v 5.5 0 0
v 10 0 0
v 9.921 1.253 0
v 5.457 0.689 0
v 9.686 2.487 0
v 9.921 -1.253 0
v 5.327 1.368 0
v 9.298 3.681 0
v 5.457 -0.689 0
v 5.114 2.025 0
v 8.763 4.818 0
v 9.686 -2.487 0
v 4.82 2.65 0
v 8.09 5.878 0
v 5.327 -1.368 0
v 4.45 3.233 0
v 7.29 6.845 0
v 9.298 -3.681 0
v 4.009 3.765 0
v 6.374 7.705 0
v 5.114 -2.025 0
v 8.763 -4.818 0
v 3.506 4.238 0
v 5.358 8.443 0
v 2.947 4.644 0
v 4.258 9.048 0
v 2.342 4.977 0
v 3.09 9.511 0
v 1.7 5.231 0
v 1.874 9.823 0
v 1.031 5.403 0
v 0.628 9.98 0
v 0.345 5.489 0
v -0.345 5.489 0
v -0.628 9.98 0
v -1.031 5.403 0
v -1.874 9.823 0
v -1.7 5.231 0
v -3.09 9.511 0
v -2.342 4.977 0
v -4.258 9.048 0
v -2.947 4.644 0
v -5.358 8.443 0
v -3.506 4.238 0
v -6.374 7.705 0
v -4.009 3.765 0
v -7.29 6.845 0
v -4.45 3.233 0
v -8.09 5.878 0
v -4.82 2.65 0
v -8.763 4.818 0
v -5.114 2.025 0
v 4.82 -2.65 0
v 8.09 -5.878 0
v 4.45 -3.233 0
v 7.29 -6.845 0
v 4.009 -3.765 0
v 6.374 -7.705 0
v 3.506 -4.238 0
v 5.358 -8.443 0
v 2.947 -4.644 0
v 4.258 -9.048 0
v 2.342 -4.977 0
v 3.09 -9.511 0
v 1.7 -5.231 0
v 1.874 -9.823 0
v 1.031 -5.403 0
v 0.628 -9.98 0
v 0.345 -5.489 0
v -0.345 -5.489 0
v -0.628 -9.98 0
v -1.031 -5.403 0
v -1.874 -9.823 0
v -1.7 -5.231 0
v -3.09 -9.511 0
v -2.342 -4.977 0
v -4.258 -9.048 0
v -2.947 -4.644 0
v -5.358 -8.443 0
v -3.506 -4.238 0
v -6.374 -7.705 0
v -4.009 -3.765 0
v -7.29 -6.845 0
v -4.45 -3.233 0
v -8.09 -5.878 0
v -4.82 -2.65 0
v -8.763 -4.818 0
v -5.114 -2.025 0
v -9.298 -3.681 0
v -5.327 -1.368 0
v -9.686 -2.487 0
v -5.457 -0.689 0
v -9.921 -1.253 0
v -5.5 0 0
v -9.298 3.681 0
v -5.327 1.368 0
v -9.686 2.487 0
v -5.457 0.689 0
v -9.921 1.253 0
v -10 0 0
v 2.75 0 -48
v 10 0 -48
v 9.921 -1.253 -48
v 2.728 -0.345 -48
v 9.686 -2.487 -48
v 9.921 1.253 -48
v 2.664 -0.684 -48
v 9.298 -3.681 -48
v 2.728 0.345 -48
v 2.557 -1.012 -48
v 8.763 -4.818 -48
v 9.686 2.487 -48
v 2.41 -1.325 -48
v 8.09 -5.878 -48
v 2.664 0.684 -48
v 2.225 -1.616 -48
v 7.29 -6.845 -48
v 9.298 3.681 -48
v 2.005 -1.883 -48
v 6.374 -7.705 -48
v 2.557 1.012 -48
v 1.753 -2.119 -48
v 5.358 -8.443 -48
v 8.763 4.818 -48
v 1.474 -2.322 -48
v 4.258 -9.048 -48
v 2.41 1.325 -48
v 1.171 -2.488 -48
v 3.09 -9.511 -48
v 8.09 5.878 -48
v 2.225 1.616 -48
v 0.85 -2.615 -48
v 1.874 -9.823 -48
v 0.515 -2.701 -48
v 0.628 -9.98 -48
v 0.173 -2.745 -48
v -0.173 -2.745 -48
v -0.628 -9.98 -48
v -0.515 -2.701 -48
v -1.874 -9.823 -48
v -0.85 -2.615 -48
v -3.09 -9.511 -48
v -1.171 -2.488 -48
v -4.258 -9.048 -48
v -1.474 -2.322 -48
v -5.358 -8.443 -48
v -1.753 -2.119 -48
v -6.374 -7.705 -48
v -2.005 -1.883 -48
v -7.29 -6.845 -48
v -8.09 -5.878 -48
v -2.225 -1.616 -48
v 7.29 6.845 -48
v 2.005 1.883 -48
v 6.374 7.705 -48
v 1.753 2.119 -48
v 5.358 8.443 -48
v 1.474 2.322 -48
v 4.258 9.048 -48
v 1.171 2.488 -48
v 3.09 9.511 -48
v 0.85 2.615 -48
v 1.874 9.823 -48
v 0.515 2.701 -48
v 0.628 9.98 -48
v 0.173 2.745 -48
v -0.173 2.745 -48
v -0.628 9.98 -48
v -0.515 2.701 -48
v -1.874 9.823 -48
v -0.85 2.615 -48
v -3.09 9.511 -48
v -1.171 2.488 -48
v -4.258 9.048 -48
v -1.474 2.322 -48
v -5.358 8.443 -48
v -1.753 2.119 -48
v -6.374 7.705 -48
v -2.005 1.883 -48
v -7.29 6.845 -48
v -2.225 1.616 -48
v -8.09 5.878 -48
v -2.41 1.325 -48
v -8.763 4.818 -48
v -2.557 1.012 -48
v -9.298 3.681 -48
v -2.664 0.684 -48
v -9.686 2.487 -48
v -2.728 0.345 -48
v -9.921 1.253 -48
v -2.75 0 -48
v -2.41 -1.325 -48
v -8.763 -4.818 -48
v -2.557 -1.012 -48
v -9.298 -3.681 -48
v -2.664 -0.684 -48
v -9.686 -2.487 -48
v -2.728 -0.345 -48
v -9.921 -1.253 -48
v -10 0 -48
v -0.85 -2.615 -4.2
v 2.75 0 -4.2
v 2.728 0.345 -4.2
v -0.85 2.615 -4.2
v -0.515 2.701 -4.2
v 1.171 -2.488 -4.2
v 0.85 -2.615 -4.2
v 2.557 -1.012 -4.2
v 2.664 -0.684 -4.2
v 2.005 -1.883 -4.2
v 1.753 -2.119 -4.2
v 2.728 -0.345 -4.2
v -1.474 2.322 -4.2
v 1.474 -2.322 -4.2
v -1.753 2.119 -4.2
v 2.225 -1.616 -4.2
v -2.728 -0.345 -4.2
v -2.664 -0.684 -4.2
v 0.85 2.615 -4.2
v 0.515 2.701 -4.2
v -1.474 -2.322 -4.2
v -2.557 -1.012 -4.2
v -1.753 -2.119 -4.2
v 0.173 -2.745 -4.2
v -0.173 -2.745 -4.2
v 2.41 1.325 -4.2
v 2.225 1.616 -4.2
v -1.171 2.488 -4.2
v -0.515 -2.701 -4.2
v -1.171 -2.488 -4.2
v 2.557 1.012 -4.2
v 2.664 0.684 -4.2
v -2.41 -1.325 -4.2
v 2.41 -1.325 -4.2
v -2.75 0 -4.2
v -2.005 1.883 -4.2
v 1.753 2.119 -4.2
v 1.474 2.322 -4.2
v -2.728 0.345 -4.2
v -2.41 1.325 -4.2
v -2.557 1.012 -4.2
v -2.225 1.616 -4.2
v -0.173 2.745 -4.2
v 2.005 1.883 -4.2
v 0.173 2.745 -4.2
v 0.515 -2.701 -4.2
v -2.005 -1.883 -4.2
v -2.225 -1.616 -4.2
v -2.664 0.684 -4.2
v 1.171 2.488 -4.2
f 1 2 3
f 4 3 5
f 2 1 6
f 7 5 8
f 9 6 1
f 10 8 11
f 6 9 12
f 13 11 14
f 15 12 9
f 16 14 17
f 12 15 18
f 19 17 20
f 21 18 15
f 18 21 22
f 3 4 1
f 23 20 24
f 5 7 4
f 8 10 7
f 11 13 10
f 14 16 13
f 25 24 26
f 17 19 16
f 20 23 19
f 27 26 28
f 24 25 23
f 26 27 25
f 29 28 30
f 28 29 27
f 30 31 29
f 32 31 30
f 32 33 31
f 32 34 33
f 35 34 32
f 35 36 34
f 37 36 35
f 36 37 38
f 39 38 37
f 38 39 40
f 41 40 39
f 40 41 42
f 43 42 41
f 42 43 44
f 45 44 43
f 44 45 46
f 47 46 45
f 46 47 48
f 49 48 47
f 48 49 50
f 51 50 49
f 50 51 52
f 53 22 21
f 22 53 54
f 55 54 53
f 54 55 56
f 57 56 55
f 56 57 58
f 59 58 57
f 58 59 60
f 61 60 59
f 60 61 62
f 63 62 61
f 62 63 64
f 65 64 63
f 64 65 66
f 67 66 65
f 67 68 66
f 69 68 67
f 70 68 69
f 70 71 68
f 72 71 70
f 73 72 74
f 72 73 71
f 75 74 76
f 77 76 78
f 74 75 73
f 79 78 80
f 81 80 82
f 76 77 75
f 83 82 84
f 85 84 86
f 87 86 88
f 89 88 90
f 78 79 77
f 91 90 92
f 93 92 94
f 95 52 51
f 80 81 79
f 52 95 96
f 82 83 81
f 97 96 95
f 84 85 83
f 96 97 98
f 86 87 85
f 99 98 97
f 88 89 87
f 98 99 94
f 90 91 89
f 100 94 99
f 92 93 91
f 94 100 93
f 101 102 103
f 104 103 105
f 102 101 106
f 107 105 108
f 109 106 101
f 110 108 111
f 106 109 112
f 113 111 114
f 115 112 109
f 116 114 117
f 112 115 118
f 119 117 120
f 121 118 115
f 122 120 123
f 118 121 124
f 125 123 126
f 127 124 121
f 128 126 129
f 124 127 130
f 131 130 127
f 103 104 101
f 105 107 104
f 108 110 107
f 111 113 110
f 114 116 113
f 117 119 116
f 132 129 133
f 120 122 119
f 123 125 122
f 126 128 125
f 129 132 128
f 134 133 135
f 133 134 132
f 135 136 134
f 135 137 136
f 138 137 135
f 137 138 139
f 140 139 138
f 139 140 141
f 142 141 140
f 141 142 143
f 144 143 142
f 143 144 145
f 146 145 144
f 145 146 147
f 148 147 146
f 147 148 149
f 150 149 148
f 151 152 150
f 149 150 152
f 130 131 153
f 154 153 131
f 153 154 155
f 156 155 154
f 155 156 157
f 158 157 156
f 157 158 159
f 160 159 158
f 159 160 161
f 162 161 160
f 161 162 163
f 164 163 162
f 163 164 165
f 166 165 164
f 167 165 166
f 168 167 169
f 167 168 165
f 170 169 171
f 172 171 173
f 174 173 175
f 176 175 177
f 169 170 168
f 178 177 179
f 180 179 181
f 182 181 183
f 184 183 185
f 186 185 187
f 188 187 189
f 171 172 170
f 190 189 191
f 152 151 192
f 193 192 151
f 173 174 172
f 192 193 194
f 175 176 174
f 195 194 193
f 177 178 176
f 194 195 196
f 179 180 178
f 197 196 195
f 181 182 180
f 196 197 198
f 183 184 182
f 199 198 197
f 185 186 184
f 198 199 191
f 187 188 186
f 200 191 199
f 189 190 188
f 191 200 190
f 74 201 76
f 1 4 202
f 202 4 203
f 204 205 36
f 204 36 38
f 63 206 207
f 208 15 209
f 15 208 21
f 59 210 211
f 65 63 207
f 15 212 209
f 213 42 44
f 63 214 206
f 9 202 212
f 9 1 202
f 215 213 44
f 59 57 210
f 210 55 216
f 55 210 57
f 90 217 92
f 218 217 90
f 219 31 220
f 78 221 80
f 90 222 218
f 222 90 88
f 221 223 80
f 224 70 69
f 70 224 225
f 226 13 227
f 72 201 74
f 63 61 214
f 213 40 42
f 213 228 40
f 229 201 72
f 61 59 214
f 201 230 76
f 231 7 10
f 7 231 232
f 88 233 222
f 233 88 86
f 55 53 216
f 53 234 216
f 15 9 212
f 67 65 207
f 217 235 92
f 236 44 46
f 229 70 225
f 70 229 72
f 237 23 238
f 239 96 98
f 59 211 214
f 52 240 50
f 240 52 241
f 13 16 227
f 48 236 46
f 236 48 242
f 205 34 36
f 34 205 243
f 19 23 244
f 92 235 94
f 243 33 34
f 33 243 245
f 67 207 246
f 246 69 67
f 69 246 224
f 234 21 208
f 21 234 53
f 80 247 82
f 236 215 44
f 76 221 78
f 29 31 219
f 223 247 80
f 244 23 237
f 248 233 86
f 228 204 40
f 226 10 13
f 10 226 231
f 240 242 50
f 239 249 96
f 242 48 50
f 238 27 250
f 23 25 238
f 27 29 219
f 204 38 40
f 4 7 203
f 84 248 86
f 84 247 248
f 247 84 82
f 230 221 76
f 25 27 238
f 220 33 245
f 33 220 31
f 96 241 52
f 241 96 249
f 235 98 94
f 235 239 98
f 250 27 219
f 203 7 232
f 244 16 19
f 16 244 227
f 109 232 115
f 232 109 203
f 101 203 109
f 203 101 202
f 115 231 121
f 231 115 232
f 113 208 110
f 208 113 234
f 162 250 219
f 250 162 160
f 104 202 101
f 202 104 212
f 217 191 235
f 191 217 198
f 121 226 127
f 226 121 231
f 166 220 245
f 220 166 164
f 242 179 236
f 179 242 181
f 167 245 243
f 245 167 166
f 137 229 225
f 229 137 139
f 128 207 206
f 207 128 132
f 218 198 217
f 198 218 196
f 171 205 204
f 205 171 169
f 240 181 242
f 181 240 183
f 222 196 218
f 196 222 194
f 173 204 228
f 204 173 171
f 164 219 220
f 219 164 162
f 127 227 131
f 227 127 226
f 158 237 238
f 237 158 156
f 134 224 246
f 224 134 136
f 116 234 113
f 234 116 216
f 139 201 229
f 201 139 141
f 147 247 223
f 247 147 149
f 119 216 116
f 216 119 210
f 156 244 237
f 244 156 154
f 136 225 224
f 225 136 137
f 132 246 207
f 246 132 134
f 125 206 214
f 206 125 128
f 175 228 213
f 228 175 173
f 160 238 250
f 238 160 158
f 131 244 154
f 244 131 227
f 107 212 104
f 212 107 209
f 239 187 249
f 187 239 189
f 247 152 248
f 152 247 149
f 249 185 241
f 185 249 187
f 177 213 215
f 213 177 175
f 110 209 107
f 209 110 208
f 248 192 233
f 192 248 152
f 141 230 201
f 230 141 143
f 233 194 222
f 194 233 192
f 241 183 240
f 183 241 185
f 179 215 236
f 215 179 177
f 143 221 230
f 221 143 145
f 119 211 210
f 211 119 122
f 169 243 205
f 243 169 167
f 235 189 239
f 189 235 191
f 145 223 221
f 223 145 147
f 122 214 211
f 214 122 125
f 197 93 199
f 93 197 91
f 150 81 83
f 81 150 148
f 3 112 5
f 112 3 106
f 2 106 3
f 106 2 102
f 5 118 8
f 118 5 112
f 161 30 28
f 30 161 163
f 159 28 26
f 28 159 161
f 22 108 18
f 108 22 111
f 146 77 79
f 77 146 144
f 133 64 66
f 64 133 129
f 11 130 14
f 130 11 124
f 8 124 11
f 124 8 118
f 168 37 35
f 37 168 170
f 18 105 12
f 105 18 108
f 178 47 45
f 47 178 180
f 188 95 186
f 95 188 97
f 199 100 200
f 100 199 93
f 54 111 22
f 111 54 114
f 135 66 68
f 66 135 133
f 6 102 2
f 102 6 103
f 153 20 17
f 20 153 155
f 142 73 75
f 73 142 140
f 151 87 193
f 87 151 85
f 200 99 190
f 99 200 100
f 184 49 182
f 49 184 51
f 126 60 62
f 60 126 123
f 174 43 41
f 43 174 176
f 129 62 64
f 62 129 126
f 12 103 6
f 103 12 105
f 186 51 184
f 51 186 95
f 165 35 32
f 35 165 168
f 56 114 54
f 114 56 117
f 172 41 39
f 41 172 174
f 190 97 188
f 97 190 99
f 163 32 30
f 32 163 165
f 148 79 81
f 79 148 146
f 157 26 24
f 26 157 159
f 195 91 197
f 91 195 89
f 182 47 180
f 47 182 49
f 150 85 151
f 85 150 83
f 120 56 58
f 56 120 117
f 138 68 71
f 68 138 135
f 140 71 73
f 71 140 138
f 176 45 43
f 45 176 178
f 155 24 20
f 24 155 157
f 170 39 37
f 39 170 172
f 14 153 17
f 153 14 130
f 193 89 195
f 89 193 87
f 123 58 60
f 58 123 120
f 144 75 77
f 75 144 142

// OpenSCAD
$fn = 50;


difference() {
	union() {
		translate(v = [0, 0, -48.0000000000]) {
			cylinder(h = 48, r = 10.0000000000);
		}
		cylinder(h = 0, r = 19.0000000000);
	}
	union() {
		translate(v = [0, 0, 0]) {
			rotate(a = [0, 0, 0]) {
				difference() {
					union() {
						#translate(v = [0, 0, -48.0000000000]) {
							cylinder(h = 48, r = 2.2500000000);
						}
						#translate(v = [0, 0, -4.2000000000]) {
							cylinder(h = 4.2000000000, r = 10.0000000000, r1 = 2.7500000000, r2 = 5.5000000000);
						}
						#translate(v = [0, 0, -48.0000000000]) {
							cylinder(h = 48, r = 2.7500000000);
						}
						#translate(v = [0, 0, -48.0000000000]) {
							cylinder(h = 48, r = 2.2500000000);
						}
					}
					union();
				}
			}
		}
	}
}
